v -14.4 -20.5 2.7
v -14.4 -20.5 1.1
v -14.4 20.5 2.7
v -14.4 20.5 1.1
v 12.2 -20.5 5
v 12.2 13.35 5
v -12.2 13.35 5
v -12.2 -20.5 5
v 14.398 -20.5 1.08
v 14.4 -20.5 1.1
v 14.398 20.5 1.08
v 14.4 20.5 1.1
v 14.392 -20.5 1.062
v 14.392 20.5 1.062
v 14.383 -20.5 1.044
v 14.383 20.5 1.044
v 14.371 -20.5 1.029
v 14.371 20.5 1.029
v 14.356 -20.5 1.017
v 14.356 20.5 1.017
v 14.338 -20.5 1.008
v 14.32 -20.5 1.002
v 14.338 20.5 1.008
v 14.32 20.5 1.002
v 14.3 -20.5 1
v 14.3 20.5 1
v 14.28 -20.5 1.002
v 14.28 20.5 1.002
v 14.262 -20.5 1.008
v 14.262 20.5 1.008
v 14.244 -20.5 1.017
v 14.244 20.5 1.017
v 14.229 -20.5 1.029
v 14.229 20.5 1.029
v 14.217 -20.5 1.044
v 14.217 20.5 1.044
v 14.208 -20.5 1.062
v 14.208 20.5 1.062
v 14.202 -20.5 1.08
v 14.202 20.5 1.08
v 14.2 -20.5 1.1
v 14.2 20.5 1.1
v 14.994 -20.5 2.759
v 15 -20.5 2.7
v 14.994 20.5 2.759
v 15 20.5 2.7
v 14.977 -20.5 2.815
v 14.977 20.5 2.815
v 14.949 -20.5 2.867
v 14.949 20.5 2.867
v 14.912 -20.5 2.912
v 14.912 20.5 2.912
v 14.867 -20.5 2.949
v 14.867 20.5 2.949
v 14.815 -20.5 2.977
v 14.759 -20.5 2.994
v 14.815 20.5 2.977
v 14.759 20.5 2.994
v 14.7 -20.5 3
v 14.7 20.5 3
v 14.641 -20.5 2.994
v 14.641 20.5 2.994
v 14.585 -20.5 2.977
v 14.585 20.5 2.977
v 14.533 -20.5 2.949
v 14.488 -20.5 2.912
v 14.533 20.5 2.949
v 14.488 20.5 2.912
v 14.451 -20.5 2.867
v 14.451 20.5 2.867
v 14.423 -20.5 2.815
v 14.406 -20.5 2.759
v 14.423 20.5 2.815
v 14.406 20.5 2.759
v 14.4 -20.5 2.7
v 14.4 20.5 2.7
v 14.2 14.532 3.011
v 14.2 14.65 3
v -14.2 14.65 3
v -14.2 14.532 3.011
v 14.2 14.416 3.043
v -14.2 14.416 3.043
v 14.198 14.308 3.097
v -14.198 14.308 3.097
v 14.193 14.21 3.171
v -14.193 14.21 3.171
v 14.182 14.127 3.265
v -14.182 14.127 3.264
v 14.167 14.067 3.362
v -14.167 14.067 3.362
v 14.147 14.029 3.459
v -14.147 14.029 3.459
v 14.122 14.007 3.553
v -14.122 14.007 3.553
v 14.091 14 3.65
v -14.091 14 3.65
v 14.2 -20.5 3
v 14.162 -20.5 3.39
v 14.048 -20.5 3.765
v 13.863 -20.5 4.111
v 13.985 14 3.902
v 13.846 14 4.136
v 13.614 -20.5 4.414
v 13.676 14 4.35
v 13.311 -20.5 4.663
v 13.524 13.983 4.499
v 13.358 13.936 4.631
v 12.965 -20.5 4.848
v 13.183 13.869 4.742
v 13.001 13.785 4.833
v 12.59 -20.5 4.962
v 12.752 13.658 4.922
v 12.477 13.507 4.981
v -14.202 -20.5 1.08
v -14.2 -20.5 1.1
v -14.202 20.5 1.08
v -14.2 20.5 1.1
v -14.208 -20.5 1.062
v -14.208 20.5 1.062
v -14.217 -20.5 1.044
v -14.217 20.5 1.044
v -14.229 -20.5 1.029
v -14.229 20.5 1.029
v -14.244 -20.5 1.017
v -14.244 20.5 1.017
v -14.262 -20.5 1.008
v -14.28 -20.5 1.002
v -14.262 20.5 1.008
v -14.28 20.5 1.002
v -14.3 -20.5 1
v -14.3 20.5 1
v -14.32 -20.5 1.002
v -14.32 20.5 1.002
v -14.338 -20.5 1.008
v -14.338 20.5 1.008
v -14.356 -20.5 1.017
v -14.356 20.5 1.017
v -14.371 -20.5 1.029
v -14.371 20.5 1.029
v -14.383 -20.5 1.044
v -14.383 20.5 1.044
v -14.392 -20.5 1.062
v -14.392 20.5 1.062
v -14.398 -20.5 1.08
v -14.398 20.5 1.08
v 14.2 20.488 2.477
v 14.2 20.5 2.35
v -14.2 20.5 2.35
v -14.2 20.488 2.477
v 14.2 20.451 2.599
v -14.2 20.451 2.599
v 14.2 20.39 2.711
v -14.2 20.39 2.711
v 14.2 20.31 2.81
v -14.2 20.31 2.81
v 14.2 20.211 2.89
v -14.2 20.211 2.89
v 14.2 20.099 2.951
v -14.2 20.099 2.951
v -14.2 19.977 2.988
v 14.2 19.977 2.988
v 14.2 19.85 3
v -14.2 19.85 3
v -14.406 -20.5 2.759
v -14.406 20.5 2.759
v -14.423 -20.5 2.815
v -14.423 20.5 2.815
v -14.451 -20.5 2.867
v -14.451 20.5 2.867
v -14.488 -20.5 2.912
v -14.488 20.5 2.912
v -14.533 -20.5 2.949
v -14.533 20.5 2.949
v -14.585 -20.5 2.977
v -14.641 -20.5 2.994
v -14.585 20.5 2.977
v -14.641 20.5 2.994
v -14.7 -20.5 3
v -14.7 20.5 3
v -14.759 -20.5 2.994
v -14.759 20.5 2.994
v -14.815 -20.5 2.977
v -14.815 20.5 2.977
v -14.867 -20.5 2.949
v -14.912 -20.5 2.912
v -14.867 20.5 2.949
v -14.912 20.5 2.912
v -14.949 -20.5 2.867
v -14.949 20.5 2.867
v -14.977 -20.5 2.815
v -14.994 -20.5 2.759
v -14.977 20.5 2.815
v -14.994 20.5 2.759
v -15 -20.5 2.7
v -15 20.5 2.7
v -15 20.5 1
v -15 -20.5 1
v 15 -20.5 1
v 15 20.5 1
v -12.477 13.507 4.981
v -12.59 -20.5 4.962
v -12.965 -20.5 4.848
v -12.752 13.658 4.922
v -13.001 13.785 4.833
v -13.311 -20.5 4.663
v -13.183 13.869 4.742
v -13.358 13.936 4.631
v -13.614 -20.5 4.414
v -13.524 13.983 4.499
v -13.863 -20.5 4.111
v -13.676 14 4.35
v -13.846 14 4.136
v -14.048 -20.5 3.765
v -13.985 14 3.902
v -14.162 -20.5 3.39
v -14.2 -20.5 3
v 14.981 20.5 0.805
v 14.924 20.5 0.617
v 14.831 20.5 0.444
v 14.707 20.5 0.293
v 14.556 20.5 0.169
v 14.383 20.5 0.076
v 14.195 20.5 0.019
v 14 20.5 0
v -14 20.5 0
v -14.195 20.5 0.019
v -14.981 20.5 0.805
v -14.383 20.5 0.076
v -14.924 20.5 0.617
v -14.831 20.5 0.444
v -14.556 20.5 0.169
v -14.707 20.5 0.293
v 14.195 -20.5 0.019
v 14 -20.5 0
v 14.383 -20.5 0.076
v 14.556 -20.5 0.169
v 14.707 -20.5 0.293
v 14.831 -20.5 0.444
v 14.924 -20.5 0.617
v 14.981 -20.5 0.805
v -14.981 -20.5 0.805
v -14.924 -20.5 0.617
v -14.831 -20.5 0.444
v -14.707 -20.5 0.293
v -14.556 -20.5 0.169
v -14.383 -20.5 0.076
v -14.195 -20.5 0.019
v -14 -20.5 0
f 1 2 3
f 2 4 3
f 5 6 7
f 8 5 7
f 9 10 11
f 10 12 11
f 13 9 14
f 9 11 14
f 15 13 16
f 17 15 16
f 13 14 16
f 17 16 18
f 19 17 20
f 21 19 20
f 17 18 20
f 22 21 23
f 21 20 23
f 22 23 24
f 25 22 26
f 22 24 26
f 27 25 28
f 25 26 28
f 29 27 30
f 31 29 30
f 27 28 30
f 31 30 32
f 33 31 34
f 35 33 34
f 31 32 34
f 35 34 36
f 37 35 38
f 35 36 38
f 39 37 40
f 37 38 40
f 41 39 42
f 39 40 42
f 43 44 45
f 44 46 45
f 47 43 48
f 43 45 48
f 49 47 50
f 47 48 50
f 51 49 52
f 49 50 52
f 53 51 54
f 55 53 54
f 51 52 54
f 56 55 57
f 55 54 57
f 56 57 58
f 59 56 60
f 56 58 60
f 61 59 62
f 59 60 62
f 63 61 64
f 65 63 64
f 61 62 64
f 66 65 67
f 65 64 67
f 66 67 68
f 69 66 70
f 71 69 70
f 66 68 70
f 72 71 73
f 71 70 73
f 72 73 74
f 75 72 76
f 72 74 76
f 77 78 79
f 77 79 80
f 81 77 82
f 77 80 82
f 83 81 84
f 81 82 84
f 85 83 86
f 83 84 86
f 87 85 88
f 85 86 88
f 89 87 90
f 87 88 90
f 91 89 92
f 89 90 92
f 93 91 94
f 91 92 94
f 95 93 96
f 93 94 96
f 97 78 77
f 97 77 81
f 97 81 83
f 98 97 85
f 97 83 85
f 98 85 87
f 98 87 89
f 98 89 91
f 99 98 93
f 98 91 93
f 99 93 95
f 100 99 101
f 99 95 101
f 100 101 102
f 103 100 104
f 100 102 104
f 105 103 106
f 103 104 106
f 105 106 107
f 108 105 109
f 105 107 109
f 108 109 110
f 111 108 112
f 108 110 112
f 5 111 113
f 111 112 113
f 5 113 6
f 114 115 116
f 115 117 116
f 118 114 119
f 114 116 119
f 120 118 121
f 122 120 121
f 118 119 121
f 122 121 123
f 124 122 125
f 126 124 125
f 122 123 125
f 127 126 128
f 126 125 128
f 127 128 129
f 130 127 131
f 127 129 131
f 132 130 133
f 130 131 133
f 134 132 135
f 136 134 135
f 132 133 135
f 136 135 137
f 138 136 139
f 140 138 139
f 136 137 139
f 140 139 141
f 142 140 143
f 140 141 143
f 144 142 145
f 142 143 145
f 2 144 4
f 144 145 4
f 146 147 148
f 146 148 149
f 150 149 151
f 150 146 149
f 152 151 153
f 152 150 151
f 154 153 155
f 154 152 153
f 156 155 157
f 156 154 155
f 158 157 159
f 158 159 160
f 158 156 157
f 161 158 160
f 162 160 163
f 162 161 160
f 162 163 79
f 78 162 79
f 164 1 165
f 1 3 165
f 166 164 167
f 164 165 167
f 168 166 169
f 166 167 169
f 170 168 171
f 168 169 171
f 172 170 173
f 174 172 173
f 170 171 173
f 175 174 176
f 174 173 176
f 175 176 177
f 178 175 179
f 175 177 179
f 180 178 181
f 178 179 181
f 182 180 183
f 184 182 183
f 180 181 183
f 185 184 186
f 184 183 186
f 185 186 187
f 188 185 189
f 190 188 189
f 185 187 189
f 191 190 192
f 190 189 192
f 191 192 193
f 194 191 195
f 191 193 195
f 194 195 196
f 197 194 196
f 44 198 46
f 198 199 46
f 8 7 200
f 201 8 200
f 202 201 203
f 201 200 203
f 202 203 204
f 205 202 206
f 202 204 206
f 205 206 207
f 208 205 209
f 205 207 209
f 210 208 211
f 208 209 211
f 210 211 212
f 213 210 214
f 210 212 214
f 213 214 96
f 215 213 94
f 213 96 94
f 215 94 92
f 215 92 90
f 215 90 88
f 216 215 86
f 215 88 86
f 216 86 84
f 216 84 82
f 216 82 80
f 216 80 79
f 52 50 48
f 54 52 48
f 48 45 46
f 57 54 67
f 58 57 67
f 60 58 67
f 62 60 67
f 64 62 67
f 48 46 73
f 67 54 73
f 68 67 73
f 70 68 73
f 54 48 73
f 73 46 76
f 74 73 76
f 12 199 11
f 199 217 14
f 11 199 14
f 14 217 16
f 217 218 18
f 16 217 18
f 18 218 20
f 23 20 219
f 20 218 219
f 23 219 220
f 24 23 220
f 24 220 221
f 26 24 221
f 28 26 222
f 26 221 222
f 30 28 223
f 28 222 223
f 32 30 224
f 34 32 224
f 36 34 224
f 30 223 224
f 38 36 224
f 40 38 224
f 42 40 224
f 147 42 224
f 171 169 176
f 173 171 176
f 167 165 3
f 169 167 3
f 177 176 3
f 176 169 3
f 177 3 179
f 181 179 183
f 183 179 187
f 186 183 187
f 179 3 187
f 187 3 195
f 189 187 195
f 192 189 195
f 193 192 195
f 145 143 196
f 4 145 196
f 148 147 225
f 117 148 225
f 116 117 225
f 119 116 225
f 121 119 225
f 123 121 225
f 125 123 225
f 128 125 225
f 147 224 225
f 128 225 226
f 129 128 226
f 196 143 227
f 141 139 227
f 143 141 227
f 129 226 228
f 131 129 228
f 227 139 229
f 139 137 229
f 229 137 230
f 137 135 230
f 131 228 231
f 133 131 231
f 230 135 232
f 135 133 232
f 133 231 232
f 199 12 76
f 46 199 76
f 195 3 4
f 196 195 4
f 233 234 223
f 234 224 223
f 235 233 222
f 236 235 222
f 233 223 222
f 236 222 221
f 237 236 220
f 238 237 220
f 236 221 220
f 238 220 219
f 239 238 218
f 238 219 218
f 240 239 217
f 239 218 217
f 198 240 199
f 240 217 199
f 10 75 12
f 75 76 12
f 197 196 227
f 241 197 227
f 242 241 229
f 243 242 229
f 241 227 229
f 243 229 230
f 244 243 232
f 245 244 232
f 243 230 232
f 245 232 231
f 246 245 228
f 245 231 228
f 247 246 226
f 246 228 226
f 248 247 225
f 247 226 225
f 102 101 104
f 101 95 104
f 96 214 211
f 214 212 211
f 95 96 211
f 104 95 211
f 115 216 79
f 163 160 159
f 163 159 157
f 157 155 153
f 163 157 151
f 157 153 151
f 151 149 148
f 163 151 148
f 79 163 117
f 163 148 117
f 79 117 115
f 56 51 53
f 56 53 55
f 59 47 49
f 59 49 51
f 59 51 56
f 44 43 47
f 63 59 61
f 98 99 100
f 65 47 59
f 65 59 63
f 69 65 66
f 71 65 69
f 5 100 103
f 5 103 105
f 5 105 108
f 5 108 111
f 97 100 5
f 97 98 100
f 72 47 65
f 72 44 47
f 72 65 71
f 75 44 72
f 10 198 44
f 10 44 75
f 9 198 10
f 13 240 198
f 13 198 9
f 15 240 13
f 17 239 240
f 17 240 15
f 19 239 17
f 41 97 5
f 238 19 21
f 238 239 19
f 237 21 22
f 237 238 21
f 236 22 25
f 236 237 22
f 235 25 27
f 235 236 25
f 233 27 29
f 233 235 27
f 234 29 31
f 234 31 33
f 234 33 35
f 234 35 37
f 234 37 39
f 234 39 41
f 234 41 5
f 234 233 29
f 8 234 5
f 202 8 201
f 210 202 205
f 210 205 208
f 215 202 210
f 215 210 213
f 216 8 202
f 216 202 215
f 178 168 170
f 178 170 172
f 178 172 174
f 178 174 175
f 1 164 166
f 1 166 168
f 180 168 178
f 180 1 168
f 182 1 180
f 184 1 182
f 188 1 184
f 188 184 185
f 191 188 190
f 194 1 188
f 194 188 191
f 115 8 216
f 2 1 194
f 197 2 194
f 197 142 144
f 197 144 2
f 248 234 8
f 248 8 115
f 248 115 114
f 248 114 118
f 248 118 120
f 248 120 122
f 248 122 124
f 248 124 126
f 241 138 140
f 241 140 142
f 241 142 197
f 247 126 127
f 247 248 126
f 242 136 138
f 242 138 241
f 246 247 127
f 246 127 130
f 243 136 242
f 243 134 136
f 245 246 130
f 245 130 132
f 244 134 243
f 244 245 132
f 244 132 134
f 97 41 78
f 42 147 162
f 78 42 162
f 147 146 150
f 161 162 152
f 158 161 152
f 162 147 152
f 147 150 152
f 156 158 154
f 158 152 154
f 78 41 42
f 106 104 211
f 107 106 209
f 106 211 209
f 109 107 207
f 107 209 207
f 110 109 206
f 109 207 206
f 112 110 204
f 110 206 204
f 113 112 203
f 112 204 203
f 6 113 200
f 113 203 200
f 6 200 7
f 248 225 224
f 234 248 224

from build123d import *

# Parameters (mm, degrees)
EXTRUDE_1_DEPTH                 = 20.5
CUT_EXTRUDE_1_REACH             = 27.889
CUT_EXTRUDE_1_DIRECTION_2_REACH = 27.889


with BuildPart() as part:
    # Эскиз1 → Бобышка-Вытянуть1 (new, symmetric)
    with BuildSketch(Plane(origin=(0, 0, 0), x_dir=(1, 0, 0), z_dir=(0, 1, 0))):
        with BuildLine():
            Line((-14, 0), (14, 0))
            ThreePointArc((14, 0), (14.707106781, -0.292893219), (15, -1))
            Line((15, -1), (15, -2.7))
            ThreePointArc((15, -2.7), (14.7, -3), (14.4, -2.7))
            Line((14.4, -2.7), (14.4, -1.1))
            ThreePointArc((14.4, -1.1), (14.3, -1), (14.2, -1.1))
            Line((14.2, -1.1), (14.2, -3))
            ThreePointArc((14.2, -3), (13.614213562, -4.414213562), (12.2, -5))
            Line((12.2, -5), (-12.2, -5))
            ThreePointArc((-12.2, -5), (-13.614213562, -4.414213562), (-14.2, -3))
            Line((-14.2, -3), (-14.2, -1.1))
            ThreePointArc((-14.2, -1.1), (-14.3, -1), (-14.4, -1.1))
            Line((-14.4, -1.1), (-14.4, -2.7))
            ThreePointArc((-14.4, -2.7), (-14.7, -3), (-15, -2.7))
            Line((-15, -2.7), (-15, -1))
            ThreePointArc((-15, -1), (-14.707106781, -0.292893219), (-14, 0))
        make_face()
    extrude(amount=EXTRUDE_1_DEPTH, both=True)

    # Эскиз2 → Вырез-Вытянуть1 (cut, up to next)
    with BuildSketch(Plane(origin=(0, 0, 0), x_dir=(0, 0, -1), z_dir=(1, 0, 0)), mode=Mode.PRIVATE) as cut_extrude_1_sk1:
        with BuildLine():
            Line((-3, 19.85), (-3, 14.65))
            ThreePointArc((-3, 14.65), (-3.190380592, 14.190380592), (-3.65, 14))
            Line((-3.65, 14), (-4.35, 14))
            ThreePointArc((-4.35, 14), (-4.809619408, 13.809619408), (-5, 13.35))
            Line((-5, 13.35), (-5, 20.5))
            Line((-5, 20.5), (-2.35, 20.5))
            ThreePointArc((-2.35, 20.5), (-2.809619408, 20.309619408), (-3, 19.85))
        make_face()
    cut_extrude_1_tool1 = extrude(cut_extrude_1_sk1.sketch, amount=-CUT_EXTRUDE_1_REACH, mode=Mode.PRIVATE) & part.part
    add(cut_extrude_1_tool1.solids().sort_by_distance((0, 17.269493, 4.003909))[0], mode=Mode.SUBTRACT)

    # Эскиз2 → Вырез-Вытянуть1 direction 2 (cut, up to next)
    with BuildSketch(Plane(origin=(0, 0, 0), x_dir=(0, 0, -1), z_dir=(1, 0, 0)), mode=Mode.PRIVATE) as cut_extrude_1_direction_2_sk1:
        with BuildLine():
            Line((-3, 19.85), (-3, 14.65))
            ThreePointArc((-3, 14.65), (-3.190380592, 14.190380592), (-3.65, 14))
            Line((-3.65, 14), (-4.35, 14))
            ThreePointArc((-4.35, 14), (-4.809619408, 13.809619408), (-5, 13.35))
            Line((-5, 13.35), (-5, 20.5))
            Line((-5, 20.5), (-2.35, 20.5))
            ThreePointArc((-2.35, 20.5), (-2.809619408, 20.309619408), (-3, 19.85))
        make_face()
    cut_extrude_1_direction_2_tool1 = extrude(cut_extrude_1_direction_2_sk1.sketch, amount=CUT_EXTRUDE_1_DIRECTION_2_REACH, mode=Mode.PRIVATE) & part.part
    add(cut_extrude_1_direction_2_tool1.solids().sort_by_distance((0, 17.269493, 4.003909))[0], mode=Mode.SUBTRACT)


solid = part.part
